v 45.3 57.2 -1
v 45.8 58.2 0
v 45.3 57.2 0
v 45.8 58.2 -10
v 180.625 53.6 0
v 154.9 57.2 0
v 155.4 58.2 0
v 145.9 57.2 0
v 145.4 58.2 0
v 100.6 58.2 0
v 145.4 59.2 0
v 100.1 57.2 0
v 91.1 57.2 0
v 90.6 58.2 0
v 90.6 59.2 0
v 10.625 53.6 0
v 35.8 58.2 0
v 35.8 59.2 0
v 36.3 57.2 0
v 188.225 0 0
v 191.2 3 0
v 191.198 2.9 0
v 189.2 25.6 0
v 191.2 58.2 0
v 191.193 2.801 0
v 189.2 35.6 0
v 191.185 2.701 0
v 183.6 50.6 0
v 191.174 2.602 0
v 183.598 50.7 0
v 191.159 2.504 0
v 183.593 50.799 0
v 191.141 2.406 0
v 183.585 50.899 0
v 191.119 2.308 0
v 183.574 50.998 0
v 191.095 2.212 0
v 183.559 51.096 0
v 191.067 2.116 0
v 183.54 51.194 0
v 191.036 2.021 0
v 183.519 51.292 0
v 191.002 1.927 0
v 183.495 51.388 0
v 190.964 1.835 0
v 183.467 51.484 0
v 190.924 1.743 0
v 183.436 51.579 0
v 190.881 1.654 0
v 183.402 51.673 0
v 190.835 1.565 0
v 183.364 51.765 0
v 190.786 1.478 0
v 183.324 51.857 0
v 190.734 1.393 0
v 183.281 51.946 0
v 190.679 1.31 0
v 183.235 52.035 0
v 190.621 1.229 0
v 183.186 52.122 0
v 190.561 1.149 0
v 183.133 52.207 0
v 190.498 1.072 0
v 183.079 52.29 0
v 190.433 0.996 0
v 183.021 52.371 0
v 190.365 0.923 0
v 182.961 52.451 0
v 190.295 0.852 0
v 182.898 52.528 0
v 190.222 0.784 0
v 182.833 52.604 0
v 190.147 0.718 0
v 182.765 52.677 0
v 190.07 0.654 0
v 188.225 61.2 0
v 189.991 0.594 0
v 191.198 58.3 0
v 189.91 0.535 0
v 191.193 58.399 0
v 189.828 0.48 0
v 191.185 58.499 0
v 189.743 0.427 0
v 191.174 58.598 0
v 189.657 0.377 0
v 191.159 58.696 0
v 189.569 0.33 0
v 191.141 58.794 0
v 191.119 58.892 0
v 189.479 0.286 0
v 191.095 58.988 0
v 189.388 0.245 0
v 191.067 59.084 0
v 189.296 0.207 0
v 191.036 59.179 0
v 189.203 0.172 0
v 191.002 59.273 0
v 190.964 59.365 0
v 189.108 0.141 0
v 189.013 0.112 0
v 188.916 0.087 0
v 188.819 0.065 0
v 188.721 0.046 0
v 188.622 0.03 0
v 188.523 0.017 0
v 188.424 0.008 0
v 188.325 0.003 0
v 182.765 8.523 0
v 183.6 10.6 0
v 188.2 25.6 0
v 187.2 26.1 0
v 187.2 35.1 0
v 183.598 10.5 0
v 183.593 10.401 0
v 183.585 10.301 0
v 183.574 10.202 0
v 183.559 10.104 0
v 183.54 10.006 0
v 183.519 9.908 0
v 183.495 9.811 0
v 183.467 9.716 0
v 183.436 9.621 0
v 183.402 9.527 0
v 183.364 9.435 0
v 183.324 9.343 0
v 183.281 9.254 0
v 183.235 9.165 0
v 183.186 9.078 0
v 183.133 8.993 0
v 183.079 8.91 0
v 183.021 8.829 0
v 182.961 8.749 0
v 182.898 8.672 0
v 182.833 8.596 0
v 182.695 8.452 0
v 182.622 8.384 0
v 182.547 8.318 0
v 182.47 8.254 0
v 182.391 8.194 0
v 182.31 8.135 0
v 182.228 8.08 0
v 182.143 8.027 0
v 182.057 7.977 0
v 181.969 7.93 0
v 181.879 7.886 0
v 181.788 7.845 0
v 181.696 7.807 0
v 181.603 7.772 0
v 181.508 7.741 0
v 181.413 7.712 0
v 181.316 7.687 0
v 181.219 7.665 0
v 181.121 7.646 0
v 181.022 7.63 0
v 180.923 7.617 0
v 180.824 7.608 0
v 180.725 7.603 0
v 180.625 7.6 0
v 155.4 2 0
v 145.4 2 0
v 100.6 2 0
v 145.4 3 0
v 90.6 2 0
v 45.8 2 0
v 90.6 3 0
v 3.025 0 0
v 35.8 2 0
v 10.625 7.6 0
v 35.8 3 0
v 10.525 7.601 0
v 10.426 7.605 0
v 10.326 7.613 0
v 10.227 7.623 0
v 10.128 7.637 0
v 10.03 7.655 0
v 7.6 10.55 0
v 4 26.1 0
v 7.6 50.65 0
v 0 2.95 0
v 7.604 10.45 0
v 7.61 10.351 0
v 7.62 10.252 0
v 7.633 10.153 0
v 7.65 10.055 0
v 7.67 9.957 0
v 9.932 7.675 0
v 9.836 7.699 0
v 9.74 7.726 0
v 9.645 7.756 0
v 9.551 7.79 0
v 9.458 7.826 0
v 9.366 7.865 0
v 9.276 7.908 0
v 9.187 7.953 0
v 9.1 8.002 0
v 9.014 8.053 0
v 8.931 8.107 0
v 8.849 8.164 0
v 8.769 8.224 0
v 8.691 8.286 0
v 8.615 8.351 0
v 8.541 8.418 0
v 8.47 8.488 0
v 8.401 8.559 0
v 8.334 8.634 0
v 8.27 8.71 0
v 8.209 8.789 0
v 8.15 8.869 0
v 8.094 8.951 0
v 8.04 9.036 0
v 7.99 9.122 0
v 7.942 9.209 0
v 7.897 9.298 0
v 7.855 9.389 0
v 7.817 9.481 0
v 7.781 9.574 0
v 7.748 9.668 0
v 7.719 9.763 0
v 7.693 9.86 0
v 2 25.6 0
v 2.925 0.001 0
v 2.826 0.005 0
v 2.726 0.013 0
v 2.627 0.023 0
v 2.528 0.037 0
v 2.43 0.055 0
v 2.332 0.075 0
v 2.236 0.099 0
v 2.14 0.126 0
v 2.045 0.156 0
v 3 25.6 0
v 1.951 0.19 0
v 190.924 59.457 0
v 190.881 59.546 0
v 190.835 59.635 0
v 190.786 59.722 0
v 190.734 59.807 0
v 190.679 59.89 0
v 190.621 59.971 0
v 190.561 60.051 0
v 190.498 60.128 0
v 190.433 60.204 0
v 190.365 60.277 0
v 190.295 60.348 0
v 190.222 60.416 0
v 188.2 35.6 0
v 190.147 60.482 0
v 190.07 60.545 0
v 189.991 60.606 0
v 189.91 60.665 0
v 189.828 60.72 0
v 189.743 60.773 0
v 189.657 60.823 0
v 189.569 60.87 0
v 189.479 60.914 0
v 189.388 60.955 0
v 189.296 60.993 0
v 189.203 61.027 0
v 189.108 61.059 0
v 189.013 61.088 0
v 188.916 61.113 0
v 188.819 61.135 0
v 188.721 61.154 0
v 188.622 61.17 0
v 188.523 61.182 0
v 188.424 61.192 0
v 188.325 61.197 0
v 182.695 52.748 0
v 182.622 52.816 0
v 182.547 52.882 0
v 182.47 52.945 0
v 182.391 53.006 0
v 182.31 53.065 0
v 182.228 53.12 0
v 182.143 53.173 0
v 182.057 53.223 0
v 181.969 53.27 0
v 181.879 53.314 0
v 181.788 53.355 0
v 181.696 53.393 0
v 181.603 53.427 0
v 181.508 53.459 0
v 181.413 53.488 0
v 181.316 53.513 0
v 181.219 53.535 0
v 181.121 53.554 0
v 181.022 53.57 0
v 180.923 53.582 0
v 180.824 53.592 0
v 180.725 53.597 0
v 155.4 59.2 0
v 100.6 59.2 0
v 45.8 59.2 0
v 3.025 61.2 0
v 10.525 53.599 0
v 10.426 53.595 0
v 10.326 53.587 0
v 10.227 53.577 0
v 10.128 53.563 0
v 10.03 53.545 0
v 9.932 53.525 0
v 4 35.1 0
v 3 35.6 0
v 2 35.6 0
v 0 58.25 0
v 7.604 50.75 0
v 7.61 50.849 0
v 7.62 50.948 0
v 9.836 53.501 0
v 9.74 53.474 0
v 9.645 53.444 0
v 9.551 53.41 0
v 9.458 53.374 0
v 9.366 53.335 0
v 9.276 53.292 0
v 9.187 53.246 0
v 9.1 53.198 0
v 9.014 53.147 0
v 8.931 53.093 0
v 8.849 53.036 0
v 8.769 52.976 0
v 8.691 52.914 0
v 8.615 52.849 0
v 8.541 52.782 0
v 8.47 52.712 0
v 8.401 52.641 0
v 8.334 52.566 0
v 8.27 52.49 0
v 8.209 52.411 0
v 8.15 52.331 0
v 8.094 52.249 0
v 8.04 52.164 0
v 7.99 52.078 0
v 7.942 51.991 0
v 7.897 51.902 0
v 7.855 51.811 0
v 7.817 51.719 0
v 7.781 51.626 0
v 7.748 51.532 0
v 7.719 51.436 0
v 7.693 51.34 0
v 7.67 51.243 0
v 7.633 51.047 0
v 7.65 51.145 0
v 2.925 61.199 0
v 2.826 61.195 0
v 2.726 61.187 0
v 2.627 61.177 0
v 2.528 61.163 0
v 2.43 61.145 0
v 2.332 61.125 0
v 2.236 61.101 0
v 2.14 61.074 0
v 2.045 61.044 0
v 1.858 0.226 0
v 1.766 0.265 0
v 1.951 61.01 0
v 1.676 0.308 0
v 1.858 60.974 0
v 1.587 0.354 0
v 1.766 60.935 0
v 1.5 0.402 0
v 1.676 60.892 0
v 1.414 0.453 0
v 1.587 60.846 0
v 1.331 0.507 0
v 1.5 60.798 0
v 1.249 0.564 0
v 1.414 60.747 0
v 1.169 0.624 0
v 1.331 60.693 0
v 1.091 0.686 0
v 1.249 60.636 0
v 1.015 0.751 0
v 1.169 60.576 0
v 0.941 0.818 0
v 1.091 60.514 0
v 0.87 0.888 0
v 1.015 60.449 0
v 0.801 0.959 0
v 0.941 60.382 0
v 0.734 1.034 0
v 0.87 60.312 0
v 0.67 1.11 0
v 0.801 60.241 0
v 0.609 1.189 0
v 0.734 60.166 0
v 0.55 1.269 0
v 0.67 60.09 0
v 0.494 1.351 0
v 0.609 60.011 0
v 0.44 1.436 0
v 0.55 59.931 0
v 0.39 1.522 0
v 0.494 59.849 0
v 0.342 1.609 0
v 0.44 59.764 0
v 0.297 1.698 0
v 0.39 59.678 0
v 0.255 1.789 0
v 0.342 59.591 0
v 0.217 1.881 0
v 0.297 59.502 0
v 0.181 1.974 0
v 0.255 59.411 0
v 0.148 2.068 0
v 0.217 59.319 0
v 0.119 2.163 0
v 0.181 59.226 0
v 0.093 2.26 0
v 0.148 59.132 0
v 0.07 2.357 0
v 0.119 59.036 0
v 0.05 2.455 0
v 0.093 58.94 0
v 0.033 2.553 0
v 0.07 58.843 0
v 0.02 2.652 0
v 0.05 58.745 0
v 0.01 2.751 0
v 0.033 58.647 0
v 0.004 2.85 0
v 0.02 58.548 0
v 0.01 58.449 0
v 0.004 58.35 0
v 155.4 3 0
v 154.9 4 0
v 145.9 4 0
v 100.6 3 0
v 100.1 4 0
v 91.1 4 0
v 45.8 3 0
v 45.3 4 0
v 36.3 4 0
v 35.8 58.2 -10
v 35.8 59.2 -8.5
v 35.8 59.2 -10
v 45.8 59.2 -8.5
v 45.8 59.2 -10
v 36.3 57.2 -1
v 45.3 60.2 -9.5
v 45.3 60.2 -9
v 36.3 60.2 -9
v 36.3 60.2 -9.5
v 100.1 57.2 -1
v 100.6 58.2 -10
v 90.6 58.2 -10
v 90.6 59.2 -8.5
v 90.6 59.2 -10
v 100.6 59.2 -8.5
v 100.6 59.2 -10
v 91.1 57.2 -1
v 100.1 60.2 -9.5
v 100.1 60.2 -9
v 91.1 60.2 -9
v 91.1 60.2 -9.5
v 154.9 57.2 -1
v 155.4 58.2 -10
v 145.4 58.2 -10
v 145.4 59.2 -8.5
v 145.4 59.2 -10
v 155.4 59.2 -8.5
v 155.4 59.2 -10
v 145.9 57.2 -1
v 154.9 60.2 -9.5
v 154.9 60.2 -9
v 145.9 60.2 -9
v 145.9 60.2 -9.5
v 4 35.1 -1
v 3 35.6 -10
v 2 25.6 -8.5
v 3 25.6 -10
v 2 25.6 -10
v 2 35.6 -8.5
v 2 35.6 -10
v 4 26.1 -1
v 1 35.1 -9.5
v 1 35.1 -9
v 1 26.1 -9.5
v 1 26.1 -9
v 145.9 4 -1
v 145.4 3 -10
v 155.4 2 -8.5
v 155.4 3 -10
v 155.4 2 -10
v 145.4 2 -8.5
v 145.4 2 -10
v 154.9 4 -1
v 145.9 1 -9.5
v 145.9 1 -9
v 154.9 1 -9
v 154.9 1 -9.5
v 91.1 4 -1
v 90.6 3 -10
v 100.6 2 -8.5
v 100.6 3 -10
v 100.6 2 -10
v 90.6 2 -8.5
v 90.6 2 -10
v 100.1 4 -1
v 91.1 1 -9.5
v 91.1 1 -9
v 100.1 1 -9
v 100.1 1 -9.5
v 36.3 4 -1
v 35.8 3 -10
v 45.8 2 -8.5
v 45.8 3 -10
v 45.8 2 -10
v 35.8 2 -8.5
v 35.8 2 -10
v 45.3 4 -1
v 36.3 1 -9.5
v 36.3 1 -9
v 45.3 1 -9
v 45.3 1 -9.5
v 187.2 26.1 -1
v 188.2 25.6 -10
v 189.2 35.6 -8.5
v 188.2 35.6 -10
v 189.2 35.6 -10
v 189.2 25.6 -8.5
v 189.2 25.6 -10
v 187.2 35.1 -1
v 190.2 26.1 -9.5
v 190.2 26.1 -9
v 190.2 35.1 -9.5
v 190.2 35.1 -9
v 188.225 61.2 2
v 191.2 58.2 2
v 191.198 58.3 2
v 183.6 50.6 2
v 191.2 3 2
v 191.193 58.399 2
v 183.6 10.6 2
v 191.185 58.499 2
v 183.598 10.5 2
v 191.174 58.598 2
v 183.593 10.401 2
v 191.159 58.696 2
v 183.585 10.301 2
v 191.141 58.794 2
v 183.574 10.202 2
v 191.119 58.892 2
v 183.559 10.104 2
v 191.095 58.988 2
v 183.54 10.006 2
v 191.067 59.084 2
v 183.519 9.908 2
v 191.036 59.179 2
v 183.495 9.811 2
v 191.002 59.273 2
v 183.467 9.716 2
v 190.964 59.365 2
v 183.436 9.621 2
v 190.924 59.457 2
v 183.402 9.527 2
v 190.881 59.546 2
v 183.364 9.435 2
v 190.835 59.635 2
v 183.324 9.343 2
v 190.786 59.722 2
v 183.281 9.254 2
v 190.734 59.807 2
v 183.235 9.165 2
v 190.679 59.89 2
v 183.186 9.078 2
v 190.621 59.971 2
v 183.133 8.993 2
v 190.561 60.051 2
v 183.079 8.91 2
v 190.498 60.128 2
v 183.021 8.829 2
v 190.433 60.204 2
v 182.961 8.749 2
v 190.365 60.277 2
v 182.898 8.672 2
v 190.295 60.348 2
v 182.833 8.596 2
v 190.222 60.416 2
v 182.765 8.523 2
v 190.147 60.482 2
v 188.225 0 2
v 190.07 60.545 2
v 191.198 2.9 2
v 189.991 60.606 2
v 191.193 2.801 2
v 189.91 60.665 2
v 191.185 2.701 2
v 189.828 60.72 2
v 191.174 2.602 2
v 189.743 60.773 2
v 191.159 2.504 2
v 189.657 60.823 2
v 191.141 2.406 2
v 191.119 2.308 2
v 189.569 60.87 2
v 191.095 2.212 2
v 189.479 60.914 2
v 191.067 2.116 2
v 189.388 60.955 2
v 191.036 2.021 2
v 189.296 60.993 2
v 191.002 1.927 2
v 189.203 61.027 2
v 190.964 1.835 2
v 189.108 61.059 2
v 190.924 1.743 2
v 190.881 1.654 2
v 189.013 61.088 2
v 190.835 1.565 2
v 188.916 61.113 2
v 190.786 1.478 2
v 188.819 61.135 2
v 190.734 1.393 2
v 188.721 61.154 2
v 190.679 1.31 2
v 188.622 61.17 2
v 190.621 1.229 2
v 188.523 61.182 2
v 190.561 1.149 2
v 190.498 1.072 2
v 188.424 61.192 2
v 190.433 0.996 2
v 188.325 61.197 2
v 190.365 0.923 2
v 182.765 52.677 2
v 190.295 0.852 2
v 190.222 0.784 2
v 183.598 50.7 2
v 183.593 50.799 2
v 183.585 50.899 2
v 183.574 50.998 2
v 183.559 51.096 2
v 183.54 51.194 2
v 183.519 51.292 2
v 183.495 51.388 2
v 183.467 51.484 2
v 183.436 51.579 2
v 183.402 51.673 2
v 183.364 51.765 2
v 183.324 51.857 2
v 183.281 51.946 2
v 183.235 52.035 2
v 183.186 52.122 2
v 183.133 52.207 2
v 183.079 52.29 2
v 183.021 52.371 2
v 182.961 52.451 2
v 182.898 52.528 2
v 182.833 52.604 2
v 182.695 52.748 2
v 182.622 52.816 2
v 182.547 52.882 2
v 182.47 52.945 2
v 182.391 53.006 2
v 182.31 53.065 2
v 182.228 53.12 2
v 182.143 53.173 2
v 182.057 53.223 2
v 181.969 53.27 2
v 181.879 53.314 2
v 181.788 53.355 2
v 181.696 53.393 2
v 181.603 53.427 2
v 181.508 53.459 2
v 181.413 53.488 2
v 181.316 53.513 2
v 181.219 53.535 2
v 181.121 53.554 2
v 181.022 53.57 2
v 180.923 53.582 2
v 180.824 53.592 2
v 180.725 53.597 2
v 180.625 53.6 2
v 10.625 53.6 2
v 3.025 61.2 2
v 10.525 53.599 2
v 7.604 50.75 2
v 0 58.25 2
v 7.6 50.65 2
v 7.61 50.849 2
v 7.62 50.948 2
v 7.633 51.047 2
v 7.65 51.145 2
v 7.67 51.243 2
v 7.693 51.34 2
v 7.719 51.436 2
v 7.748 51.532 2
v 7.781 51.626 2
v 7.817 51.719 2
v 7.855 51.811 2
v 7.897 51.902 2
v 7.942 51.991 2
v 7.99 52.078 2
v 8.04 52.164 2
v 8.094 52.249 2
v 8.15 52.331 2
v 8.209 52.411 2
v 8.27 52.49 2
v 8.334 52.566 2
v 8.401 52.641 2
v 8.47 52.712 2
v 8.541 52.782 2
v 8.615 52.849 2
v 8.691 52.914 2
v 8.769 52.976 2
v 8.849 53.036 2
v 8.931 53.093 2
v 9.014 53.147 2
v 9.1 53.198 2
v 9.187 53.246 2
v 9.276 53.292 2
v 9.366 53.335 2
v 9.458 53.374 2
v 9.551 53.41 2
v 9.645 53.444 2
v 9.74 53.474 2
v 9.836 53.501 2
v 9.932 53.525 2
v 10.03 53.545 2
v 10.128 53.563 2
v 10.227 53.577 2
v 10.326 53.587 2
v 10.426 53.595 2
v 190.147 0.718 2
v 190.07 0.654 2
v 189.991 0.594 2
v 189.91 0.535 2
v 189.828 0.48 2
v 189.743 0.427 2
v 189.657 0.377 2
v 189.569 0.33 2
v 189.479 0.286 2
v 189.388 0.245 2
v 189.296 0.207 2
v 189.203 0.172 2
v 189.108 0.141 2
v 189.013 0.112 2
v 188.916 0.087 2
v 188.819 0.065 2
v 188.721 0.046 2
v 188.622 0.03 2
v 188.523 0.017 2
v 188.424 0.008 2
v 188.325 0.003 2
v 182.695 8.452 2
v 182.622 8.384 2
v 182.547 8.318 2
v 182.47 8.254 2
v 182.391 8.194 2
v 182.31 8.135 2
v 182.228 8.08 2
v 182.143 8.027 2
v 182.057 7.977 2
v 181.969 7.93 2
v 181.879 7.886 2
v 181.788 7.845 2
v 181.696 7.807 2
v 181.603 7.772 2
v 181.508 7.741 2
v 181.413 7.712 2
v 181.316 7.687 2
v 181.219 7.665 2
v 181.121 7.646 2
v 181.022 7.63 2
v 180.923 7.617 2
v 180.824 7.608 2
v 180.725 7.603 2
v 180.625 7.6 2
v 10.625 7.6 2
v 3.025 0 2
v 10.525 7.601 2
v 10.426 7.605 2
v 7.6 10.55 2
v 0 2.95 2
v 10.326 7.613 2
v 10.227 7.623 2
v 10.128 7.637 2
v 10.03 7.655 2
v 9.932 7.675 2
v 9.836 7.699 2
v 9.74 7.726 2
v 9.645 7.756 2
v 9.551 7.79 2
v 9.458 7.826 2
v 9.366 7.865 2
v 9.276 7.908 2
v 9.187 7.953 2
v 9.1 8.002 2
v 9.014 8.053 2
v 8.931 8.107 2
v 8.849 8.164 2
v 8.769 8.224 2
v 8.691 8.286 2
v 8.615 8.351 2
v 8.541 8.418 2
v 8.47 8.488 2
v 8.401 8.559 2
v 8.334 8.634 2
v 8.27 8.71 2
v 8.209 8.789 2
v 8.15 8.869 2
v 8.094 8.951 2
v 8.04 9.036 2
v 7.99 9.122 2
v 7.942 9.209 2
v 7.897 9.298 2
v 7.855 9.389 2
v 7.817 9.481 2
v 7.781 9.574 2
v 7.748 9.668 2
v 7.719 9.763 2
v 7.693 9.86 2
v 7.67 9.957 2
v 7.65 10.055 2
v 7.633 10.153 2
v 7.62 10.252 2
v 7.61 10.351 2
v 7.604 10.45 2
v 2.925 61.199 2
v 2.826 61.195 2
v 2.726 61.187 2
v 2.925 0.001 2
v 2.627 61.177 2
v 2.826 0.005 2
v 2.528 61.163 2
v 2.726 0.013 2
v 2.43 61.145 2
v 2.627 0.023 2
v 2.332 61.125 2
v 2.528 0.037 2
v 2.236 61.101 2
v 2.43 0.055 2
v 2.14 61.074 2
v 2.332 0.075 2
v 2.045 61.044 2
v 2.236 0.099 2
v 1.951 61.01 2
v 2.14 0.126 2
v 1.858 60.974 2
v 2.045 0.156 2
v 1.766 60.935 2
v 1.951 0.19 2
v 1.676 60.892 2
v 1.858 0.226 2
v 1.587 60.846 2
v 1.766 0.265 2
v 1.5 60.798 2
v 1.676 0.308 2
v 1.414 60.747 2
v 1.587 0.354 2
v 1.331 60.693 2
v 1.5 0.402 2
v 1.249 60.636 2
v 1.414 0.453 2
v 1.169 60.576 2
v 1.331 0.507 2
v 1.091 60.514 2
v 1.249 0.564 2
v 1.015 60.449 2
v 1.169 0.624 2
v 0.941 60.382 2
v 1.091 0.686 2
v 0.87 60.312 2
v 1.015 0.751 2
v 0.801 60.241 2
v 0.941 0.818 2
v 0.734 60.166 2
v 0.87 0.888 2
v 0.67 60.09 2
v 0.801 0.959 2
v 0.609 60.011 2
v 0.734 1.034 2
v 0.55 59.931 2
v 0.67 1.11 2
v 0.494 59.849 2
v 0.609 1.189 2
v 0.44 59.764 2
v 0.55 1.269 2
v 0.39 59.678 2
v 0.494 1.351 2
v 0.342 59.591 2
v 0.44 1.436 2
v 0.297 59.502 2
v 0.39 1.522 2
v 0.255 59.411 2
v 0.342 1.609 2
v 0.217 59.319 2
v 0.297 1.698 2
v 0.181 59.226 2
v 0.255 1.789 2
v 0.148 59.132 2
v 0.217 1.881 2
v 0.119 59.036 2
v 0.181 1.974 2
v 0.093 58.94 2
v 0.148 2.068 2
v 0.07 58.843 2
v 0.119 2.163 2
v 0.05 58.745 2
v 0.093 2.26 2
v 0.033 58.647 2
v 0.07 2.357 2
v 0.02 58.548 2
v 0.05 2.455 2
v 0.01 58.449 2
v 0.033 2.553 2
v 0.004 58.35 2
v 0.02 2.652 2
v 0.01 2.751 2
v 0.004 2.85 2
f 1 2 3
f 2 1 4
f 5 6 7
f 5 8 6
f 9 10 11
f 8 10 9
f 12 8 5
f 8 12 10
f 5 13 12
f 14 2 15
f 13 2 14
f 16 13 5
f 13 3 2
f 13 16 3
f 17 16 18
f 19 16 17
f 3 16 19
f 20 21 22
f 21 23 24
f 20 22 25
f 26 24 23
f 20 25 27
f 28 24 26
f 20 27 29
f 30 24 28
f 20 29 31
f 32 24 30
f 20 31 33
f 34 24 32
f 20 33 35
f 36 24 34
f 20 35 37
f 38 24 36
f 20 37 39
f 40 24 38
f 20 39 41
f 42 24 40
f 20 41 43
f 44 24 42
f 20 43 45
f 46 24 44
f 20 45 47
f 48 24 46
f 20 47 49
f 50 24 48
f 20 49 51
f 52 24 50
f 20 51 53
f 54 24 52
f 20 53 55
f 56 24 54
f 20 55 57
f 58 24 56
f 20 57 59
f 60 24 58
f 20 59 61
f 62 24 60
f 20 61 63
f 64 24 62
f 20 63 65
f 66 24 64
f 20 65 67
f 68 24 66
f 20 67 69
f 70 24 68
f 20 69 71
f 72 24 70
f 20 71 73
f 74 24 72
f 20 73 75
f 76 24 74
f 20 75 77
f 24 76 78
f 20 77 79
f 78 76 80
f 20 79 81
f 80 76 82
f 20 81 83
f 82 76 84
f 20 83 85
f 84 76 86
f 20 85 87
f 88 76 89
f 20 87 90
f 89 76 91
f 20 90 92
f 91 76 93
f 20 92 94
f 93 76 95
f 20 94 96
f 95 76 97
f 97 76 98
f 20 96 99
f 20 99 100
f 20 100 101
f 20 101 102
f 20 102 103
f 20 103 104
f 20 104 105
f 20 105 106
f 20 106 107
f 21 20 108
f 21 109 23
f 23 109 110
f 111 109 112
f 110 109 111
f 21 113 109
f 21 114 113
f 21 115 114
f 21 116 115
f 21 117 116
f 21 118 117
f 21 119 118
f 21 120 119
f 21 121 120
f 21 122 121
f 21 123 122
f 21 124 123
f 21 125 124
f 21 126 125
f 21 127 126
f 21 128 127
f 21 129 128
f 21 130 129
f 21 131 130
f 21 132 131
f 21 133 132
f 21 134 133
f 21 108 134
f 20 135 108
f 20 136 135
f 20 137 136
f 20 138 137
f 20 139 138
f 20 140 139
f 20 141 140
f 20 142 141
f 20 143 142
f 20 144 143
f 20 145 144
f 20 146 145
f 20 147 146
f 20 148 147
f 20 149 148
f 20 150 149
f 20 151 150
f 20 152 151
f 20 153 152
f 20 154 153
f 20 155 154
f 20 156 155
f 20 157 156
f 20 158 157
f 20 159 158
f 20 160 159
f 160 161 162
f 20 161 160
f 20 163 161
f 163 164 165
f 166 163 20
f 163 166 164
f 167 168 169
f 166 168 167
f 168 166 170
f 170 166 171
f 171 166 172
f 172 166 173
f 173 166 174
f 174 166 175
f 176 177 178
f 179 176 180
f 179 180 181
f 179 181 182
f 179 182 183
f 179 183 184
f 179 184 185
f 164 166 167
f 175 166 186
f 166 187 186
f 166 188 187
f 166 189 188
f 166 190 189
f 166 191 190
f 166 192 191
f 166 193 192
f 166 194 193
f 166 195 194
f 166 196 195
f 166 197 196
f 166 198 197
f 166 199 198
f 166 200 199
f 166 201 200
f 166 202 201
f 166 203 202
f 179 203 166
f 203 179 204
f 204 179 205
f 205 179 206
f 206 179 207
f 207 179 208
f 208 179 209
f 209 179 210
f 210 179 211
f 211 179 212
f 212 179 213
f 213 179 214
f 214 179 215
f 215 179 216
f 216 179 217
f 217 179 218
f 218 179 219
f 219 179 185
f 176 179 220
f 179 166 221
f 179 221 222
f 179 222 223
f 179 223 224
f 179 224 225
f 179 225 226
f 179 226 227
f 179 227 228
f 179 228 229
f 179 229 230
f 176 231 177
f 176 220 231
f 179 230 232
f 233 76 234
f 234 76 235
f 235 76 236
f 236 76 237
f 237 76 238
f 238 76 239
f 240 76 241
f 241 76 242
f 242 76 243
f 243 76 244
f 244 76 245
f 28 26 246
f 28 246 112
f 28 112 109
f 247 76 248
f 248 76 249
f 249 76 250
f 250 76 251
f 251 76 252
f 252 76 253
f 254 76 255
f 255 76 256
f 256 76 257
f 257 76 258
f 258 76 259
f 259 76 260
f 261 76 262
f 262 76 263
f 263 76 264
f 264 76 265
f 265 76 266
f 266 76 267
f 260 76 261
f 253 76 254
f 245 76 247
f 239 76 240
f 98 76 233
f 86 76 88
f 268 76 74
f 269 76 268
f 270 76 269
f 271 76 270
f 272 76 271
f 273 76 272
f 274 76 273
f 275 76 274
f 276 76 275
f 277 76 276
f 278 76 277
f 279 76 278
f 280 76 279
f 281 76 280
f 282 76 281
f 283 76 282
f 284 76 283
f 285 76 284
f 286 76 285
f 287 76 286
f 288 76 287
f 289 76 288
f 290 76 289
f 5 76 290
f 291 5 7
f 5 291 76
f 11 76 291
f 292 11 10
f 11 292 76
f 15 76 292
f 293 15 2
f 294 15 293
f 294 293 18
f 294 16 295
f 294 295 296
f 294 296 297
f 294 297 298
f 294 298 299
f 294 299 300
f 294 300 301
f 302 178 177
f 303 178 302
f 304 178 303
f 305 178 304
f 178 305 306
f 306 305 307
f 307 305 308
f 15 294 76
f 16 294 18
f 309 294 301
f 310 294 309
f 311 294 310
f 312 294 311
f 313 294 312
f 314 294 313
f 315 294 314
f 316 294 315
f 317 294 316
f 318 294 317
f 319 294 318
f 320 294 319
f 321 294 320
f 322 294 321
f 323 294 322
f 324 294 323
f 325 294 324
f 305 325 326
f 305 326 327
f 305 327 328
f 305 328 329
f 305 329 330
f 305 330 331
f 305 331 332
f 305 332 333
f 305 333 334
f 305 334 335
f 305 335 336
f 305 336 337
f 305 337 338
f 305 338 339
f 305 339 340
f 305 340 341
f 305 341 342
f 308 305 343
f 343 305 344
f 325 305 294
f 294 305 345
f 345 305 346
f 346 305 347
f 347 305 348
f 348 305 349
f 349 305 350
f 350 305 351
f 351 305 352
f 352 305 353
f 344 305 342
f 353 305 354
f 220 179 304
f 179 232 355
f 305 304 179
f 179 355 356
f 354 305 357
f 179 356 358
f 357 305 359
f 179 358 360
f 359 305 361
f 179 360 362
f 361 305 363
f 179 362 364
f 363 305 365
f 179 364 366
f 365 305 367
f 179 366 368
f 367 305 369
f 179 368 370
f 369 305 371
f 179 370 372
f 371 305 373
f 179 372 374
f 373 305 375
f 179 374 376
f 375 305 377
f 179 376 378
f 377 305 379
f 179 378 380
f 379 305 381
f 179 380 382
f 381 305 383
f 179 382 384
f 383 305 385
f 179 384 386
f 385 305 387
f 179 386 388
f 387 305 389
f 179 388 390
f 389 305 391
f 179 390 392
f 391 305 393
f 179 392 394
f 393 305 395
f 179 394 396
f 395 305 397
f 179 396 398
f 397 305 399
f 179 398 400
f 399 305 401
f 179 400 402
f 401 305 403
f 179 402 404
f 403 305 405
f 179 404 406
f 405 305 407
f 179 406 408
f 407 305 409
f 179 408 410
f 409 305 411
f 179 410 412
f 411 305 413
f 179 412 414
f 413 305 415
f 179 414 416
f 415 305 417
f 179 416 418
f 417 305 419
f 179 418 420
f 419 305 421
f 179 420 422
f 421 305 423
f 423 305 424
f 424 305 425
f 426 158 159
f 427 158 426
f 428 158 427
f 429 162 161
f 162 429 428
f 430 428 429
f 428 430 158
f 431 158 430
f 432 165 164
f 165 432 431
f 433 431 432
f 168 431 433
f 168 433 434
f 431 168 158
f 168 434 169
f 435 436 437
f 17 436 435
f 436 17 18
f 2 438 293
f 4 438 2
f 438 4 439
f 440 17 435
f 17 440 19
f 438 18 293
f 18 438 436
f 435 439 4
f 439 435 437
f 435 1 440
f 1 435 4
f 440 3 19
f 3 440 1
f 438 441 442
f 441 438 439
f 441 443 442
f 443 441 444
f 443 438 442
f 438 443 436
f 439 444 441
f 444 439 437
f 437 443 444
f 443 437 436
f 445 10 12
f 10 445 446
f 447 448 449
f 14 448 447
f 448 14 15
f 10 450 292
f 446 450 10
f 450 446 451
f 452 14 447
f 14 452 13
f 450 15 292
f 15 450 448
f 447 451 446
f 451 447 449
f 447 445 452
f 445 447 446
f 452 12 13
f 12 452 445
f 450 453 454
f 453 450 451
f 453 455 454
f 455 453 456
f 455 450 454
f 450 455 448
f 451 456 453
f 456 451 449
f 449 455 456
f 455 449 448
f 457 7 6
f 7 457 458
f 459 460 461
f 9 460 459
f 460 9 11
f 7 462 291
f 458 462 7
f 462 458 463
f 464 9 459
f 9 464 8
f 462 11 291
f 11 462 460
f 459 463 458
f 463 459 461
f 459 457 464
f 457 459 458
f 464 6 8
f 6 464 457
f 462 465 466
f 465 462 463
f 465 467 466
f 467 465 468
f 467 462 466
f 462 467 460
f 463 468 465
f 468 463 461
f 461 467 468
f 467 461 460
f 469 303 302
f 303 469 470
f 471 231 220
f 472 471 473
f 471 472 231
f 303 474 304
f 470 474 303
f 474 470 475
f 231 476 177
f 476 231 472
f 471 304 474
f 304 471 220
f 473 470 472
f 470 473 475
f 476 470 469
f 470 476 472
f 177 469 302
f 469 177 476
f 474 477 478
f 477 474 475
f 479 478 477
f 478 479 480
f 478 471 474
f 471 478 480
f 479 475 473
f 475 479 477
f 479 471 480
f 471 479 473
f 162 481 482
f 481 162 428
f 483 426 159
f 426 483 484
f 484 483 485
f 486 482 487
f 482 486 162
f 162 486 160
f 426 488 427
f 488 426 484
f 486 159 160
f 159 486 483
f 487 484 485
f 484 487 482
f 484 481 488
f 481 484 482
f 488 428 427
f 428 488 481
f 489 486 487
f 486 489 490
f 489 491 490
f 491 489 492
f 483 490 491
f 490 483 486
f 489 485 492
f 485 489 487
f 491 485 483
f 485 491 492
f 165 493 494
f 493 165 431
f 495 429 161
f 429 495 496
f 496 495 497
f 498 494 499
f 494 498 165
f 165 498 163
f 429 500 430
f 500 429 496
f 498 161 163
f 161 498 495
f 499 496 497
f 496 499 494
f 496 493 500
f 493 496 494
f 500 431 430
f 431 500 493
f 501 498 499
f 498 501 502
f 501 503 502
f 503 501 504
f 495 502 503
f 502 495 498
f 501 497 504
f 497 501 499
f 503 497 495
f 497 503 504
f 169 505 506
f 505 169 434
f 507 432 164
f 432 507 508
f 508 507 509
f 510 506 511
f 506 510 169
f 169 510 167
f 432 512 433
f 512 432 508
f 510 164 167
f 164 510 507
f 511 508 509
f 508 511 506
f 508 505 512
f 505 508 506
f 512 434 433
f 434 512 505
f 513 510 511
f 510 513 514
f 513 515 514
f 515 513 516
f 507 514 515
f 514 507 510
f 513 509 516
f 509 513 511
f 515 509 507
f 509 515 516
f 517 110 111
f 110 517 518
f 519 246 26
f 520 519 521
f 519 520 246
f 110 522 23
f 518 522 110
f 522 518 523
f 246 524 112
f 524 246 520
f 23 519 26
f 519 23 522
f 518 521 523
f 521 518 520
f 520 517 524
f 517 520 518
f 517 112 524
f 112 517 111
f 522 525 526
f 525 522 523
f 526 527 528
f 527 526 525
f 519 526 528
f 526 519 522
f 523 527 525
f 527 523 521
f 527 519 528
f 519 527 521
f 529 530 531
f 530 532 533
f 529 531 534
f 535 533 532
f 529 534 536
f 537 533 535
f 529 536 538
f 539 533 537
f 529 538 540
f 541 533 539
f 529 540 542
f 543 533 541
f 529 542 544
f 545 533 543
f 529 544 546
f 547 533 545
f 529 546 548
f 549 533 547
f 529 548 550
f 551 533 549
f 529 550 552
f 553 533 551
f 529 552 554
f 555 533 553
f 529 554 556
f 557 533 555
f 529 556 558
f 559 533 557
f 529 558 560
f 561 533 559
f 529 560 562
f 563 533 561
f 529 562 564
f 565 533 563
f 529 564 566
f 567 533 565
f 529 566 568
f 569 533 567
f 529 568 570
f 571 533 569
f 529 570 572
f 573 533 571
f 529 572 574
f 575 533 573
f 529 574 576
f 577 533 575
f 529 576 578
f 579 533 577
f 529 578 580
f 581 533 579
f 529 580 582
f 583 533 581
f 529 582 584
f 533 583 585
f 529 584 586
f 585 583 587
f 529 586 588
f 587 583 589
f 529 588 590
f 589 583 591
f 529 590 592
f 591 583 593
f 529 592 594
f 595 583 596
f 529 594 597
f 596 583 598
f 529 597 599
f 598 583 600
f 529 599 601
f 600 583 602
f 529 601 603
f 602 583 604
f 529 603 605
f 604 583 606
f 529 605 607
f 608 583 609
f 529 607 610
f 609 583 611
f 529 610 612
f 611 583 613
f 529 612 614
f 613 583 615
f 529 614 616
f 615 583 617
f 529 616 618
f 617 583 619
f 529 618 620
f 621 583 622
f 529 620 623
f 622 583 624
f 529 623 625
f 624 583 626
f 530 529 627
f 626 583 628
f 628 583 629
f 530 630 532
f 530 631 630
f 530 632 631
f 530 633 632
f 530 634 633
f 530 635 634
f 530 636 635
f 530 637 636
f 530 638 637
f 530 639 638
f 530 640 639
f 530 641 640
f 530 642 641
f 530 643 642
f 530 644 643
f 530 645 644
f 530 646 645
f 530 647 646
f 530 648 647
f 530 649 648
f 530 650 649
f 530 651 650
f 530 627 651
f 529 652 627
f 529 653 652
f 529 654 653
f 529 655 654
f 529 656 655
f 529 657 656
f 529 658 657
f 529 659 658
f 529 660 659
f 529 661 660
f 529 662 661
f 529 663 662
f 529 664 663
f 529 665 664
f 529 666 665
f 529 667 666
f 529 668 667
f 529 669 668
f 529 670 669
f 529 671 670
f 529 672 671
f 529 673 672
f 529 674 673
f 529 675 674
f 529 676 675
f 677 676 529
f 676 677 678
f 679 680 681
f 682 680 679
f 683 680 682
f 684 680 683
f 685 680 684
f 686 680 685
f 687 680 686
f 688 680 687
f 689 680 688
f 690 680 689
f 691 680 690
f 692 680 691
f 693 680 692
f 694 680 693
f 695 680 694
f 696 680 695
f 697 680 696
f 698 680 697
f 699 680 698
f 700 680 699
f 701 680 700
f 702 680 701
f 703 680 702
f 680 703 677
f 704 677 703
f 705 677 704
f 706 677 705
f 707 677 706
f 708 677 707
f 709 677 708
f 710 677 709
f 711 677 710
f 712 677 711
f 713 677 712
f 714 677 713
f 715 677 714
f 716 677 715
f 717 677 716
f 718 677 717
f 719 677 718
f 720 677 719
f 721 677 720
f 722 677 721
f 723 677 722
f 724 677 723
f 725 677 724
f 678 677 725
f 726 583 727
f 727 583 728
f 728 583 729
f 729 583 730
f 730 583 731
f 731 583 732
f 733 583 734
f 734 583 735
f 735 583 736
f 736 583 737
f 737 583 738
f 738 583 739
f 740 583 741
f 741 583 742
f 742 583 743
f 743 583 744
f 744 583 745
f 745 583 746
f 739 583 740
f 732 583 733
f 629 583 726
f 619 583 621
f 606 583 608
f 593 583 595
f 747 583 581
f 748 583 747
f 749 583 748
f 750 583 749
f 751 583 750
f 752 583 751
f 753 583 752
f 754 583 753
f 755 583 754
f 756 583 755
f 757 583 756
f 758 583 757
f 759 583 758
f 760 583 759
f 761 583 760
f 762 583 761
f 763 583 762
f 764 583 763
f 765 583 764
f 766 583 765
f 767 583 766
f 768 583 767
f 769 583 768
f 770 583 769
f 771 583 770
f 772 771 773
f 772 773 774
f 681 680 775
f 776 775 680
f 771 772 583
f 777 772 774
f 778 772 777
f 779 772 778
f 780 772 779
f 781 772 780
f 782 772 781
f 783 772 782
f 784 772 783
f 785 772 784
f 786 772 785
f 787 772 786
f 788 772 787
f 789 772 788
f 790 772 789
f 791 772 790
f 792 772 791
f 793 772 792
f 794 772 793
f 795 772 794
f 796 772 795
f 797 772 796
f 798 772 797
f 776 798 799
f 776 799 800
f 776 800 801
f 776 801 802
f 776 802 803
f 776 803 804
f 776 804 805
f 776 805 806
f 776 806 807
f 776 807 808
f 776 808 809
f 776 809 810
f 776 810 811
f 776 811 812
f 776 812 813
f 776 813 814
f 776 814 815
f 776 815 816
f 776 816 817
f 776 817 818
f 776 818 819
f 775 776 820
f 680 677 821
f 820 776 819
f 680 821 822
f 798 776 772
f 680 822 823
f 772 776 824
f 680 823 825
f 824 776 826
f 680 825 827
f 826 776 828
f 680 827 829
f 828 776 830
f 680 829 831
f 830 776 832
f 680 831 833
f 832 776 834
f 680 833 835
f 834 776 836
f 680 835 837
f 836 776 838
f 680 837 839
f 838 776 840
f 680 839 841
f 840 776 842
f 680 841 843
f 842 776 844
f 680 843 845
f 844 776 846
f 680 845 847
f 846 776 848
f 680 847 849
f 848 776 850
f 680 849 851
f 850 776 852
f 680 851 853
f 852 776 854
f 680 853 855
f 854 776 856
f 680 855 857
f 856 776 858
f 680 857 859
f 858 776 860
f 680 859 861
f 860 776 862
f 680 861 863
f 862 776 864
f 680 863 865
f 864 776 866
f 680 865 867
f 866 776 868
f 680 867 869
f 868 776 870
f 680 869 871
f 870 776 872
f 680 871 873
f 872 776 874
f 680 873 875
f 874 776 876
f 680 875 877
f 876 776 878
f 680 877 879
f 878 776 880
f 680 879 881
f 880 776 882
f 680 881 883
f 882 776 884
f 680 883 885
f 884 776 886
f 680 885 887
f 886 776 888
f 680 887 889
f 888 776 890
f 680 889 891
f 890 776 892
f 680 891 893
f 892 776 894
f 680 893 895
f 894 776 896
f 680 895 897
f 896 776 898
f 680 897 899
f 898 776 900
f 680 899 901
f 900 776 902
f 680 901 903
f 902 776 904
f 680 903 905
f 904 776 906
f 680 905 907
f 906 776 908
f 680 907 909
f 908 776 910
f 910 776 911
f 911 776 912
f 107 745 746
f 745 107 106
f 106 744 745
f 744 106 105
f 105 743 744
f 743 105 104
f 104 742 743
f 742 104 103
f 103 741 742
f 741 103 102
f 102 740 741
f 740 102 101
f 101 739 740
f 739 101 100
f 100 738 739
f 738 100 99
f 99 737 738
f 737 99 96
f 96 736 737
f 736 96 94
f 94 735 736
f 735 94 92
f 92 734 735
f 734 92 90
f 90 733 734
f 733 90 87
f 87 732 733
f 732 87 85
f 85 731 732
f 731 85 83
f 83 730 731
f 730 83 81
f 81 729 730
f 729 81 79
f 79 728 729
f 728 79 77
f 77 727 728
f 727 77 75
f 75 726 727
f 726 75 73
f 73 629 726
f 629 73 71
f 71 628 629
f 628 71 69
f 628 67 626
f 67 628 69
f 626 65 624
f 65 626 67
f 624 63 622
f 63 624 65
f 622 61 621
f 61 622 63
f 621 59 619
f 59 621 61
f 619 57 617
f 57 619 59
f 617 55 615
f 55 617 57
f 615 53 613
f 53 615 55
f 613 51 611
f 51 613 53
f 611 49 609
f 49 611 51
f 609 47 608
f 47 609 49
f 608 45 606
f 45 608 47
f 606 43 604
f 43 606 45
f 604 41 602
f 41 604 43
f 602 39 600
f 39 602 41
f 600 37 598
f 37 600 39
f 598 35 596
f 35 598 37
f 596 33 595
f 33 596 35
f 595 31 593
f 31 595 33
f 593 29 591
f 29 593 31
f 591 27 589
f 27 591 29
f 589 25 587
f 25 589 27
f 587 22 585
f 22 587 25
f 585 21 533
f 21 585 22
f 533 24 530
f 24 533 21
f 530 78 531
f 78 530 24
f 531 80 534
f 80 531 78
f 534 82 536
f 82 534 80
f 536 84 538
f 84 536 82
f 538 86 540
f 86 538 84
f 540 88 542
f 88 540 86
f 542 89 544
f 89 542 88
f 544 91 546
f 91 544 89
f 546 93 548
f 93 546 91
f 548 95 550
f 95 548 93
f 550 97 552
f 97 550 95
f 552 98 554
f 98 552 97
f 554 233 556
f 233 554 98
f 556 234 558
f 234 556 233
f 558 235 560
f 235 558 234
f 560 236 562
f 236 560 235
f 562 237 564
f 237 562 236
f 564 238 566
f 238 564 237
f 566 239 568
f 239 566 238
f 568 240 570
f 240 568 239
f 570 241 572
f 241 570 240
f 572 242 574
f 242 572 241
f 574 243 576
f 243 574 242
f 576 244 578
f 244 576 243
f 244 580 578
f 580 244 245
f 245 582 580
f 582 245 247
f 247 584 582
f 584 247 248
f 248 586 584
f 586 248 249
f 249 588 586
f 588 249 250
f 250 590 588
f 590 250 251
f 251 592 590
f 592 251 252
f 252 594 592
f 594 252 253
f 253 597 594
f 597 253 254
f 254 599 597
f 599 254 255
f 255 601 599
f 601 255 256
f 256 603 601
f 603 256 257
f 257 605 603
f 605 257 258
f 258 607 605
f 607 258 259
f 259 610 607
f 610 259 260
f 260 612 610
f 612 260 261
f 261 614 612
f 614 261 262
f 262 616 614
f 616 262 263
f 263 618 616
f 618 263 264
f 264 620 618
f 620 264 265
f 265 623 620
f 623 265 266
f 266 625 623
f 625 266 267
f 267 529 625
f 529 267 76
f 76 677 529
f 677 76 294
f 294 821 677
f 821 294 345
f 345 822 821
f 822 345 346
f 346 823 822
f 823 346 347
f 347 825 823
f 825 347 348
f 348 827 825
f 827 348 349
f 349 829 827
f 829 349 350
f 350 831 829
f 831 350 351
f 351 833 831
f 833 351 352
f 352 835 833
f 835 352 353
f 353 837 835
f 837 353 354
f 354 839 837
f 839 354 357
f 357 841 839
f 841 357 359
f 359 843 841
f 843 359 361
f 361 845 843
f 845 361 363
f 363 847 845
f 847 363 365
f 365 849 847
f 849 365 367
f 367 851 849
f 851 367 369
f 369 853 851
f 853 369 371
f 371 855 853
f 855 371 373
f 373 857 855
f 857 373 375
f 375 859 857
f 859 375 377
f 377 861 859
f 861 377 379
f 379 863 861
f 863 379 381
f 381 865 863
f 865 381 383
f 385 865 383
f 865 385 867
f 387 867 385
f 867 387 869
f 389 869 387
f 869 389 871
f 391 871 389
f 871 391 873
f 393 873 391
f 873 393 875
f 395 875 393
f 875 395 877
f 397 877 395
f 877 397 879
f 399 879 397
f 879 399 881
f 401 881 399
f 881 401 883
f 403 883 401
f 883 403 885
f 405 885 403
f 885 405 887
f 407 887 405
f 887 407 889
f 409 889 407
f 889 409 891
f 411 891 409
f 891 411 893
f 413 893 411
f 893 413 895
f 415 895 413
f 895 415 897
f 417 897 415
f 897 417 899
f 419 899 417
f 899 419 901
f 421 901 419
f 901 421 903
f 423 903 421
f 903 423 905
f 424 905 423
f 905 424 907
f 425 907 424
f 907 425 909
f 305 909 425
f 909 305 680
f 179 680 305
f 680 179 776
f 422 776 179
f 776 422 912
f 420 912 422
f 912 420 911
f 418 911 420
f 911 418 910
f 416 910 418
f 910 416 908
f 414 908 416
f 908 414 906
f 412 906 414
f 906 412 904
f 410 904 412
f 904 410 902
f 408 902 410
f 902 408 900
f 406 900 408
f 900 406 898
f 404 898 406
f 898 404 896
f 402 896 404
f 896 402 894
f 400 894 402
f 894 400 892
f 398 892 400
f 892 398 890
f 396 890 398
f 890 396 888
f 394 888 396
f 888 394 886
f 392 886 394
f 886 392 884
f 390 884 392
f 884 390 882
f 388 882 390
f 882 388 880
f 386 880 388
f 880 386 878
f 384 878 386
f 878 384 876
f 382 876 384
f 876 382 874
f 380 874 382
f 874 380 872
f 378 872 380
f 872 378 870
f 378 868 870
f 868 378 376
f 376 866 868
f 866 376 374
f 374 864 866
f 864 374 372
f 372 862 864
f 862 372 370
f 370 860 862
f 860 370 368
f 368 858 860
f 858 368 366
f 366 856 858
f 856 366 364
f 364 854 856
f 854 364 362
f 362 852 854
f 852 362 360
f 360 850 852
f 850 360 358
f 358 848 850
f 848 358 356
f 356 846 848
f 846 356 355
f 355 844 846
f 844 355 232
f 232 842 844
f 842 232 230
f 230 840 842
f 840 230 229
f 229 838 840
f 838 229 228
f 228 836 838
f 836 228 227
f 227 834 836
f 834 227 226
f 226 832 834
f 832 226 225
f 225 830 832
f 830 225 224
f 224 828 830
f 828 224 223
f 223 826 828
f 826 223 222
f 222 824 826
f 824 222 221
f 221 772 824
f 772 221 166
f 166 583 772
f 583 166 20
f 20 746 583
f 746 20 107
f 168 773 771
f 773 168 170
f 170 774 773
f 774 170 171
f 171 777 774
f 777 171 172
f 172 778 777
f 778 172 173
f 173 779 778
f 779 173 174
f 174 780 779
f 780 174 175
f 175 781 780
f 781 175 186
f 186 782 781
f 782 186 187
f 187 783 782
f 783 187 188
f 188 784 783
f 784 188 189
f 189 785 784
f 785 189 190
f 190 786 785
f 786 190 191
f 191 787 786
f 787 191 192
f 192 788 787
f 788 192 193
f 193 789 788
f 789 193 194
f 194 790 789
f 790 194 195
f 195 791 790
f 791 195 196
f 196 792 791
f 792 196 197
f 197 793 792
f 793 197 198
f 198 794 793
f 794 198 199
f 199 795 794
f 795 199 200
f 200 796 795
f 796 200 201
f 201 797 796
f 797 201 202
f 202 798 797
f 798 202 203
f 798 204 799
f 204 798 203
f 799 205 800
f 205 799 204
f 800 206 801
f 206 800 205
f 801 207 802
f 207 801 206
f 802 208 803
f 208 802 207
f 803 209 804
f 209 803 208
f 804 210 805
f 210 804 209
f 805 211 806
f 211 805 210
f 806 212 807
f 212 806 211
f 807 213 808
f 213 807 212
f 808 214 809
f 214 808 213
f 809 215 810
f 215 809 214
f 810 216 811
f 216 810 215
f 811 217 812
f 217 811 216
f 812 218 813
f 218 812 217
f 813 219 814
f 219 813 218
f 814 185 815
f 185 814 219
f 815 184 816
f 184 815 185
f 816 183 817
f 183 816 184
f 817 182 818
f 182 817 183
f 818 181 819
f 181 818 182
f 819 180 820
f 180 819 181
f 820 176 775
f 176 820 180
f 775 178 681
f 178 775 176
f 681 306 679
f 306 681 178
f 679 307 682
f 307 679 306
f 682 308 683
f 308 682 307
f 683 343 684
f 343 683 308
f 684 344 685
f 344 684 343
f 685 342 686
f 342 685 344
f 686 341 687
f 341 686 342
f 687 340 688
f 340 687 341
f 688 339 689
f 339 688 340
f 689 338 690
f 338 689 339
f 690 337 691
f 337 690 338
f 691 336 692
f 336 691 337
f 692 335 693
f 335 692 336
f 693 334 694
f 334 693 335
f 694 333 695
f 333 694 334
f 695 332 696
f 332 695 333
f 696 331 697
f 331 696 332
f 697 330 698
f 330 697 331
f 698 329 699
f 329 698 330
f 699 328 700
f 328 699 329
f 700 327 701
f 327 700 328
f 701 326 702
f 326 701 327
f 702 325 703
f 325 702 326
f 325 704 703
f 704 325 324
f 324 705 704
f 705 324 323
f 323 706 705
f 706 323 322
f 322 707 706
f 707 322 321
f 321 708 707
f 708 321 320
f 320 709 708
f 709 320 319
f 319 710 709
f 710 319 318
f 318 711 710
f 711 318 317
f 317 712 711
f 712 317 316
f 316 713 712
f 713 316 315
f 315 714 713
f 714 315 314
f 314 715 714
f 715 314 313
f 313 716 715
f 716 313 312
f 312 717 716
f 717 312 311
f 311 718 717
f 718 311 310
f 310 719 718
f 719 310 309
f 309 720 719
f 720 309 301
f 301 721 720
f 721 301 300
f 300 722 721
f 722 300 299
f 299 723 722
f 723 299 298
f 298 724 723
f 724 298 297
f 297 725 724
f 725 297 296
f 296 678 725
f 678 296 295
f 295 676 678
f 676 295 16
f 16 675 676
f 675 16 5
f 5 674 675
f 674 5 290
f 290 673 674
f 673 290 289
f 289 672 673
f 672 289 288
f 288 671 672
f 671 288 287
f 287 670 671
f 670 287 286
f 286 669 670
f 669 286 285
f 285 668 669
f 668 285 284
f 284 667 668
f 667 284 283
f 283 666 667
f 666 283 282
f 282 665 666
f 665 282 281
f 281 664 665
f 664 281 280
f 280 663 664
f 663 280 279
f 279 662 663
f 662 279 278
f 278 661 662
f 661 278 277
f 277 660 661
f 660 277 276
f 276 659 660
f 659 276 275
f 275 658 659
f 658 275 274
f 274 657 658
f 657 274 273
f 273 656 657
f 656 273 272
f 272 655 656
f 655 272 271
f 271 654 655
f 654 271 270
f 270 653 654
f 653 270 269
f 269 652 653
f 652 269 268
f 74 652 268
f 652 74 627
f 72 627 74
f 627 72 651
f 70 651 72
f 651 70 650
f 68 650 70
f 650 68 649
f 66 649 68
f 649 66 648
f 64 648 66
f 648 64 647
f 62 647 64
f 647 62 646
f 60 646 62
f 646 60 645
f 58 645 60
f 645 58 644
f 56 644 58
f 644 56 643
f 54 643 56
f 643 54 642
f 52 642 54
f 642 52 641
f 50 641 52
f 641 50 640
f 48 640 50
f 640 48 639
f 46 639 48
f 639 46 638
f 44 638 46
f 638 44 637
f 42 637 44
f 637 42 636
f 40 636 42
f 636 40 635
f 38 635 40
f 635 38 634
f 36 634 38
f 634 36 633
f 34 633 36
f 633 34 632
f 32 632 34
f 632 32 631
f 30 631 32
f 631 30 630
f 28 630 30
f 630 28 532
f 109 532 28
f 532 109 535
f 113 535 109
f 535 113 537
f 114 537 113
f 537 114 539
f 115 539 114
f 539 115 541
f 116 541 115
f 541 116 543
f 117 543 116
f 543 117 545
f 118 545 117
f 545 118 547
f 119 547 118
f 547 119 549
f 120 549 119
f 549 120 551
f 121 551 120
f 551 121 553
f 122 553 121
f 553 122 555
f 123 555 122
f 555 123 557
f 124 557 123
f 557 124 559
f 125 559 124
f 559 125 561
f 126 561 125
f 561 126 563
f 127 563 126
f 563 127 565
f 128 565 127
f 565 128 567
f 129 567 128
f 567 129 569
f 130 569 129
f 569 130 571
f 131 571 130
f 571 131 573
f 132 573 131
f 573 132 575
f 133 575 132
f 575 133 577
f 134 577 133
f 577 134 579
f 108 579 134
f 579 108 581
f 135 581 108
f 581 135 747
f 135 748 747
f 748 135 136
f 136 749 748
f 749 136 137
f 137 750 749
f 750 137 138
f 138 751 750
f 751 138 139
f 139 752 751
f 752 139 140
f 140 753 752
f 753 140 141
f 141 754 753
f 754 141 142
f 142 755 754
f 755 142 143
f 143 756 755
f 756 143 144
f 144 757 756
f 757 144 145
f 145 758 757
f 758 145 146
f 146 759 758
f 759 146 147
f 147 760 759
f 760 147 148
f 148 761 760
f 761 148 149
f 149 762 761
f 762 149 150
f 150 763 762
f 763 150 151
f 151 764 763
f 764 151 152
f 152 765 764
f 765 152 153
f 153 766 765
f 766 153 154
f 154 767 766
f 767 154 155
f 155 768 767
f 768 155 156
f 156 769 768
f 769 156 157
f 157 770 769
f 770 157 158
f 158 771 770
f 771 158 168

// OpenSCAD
// file: vitamins/seesaw.scad
$fa = 1;
$fs = 0.5;

BOARD_THICKNESS = 1.57;

seesaw();

module seesaw() {
  difference() {
    union() {
      cube([40, 5, BOARD_THICKNESS]);

      translate([0, 5, 0])
      cube([40, 25, 13]);
    }

    translate([(40 - 36.5) / 2, 2.5])
    union() {
      hole([0, 0]);
      hole([36.5, 0]);
    }
  }
}


module hole(pos) {
  translate(pos)
  translate([0, 0, -1])
  cylinder(d=2.5, h=3);
}
// file: vitamins/neopixel.scad
$fa = 1;
$fs = 0.5;

// This appears to be a standard circuit board size
BOARD_THICKNESS = 0.78;

neopixel();

module neopixel() {
  // Board
  cylinder(d=12.7, h=BOARD_THICKNESS);

  // LED
  linear_extrude(2.5)
  square([5, 5], center=true);
}
// file: util/standoff.scad
$fn = 50;

standoff(height=3, board_size=1.57);

translate([20, 20])
positive_standoff(height=3, board_size=1.57);


color("white")
translate([0, 0, 5.4])
mirror([0, 0, 1])
standoff_pin(height=3, board_size=1.57);

module standoff(height, board_size) {
  difference() {
    union() {
      cylinder(h=height, d=3.5);
    }

    translate([0, 0, .2])
    cylinder(h=height + board_size, d=2.1);

  }
  fillet(width=3.5, r=2);
}

module positive_standoff(height, board_size) {
  union() {
    cylinder(h=height, d=3.5);
    cylinder(h=height + board_size, d=2.5);
  }
  fillet(width=3.5, r=2);
}

module standoff_pin(height, board_size) {
  cylinder(h=0.5, d=3.5);
  hull() {
    cylinder(h=height, d=2.3);

    translate([0, 0, height + board_size - 0.1])
    cylinder(h=0.1, d=1);
  }
}

module fillet(width, r) {
  rotate_extrude()
  translate([width/2, 0])
  difference() {
    square(r);

    translate([r, r])
    circle(r);
  }
}
// file: light_holder.scad
use <vitamins/neopixel.scad>;
/* use <vitamins/rpi0.scad>;
use <vitamins/seesaw.scad>; */


$fa = 1;
$fs = 0.1;

HOLE = 7.2;
HEIGHT = 2.5;
ID = 13.4;
OD = 15;
WALL = (OD - ID) / 2;
NOTCH = [0.75, 1];
OVERHANG = 0.6;


light_holder();


module light_holder() {
  rotate_extrude()
  light_holder_profile();
}

module light_holder_outline() {
  rotate_extrude()
  union() {
    light_holder_profile();
    hull() {
      square([ID / 2, HEIGHT]);
      square([ID / 2 - OVERHANG, HEIGHT + 0.7]);
    }
  }
}

module light_holder_profile() {
  translate([HOLE / 2, 0])
  square([(ID - HOLE) / 2, 0.5]);

  translate([ID / 2, 0])
  square([WALL, HEIGHT]);

  translate([ID / 2, HEIGHT])
  hull() {
    square([WALL, 0.2]);

    translate([-OVERHANG, 0.5])
    square([WALL, 0.2]);
  }

  translate([OD / 2, 0])
  square(NOTCH);
}

/* translate([20, 20]) */
/* translate([0, 0, 2])
mirror([0, 0, 1])
color("PaleGreen")
neopixel(); */
// file: vitamins/rpi0.scad
// From: https://www.raspberrypi.org/documentation/hardware/raspberrypi/mechanical/rpi_MECH_Zero_1p3.pdf
use <../util/panel.scad>;

$fa = 1;
$fs = 0.5;


// This appears to be a standard circuit board size
BOARD_THICKNESS = 1.57;

rpi0();

module rpi0() {
  difference() {
    translate([3, 3])
    panel(l=30 - 6, w=65 - 6)
    cylinder(r=3, h=BOARD_THICKNESS);


    hole([3.5, 3.5]);
    hole([58 + 3.5, 3.5]);
    hole([58 + 3.5, 30 - 3.5]);
    hole([3.5, 30 - 3.5]);
  }

  place(x=41.1)
  usb();

  place(x=54)
  usb();

  place(y=16.9)
  microsd();

  place(x=12.4)
  hdmi();

  place(y=15, x=65)
  mirror([1, 0, 0])
  ribbon();
}

module place(x=0, y=0) {
  translate([x, y, BOARD_THICKNESS])
  children();
}

module hole(pos) {
  translate(pos)
  translate([0, 0, -1])
  cylinder(d=2.5, h=3);
}

module usb() {
  translate([-4, -1.5, 0])
  cube([8, 6, 3]);
}

module microsd() {
  translate([-2.5, -6, 0])
  cube([15.5, 12, 1.4]);
}

module hdmi() {
  translate([-11.25/2, -0.5, 0])
  cube([11.25, 7.75, 3.5]);
}

module ribbon() {
  translate([-1.25, -17/2, 0])
  cube([4.5, 17, 1.25]);
}
// file: vitamins/mounting_screw.scad
$fa = 1;
$fs = 0.5;


color("silver", 0.5)
translate([0, 6.5, -2.25])
mounting_screw();

linear_extrude(2)
difference() {
  square(30, center=true);
  mounting_screw_hole();
}
translate([30, 0, 0])
linear_extrude(2.5)
difference() {
  square(30, center=true);
  mounting_screw_hole();
}

module mounting_screw() {
  cylinder(h=2, d=8);

  translate([0, 0, 2]) {
    cylinder(h=2.5, d=4);

    translate([0, 0, 2.5]) {
      cylinder(h=1.5, d=8);
    }
  }

  hull() {
    cylinder(h=23, d=4);

    translate([0, 0, 28.5])
    sphere(0.01);
  }
}

module mounting_screw_hole() {
  circle(d=9.5);

  hull() {
    square(center=true, 4.25);
    translate([0, (9.5 + 4.25) / 2, 0])
    circle(d=4.25);
  }
}
// file: seesaw_mount.scad
use <util/panel.scad>;
use <util/standoff.scad>;

$fa = 1;
$fs = 0.1;

translate([2.5, 2.5, 1])
seesaw_mount();

linear_extrude(1)
rounded_panel([45, 30]);

module seesaw_mount() {
  module hole(pos) {
    translate(pos)
    standoff(height=13, board_size=1.57);
  }

  translate([(40 - 36.5) / 2, 2.5])
  union() {
    hole([0, 0]);
    hole([36.5, 0]);
  }
}
// file: rpi0_mount.scad
use <util/panel.scad>;
use <util/standoff.scad>;

$fa = 1;
$fs = 0.1;

translate([2.5, 2.5, 1])
rpi0_mount();

linear_extrude(1)
rounded_panel([70, 35]);

module rpi0_mount() {
  module hole(pos, screw=false) {
    translate(pos)
    if (screw) {
      standoff(height=5, board_size=1.57);
    } else {
      positive_standoff(height=5, board_size=1.57);
    }
  }

  hole([3.5, 3.5], screw=true);
  hole([58 + 3.5, 3.5]);
  hole([58 + 3.5, 30 - 3.5], screw=true);
  hole([3.5, 30 - 3.5]);
}
// file: light_box.scad
use <util/panel.scad>;
use <light_holder.scad>;

$fa = 1;
$fs = 0.1;

OUTDER_DIMENSIONS = [180, 50];
WALLS = [2, 2];
HEIGHT = 18;
FLOOR = 0.5;

light_box();

module light_box() {
  translate([0, 0, FLOOR])
  shell();

  linear_extrude(FLOOR)
  rounded_panel(OUTDER_DIMENSIONS);
}

function light_box_dimensions() = OUTDER_DIMENSIONS;
function light_box_height() = HEIGHT + FLOOR;



module light_cutout() {
  OVERHANG = 4;
  translate([0, 2, 0])
  rotate([90, 0, 0])
  union() {
    light_holder_outline();

    // Make the base taller so it can sit flush when cut out
    translate([0, 0, -0.5])
    light_holder_outline();

    translate([0, 50, WALLS[0] / 2])
    cube([15 - OVERHANG, 100, 2 * WALLS[0]], center = true);
  }
}

module shell() {
  difference() {
    linear_extrude(HEIGHT)
    difference() {
      rounded_panel(OUTDER_DIMENSIONS);

      translate(WALLS)
      rounded_panel(OUTDER_DIMENSIONS - 2 * WALLS);
    }

    union() {
      translate([OUTDER_DIMENSIONS[0] / 2, 0, HEIGHT / 2])
      light_cutout();

      translate([OUTDER_DIMENSIONS[0], OUTDER_DIMENSIONS[1] / 2, HEIGHT / 2])
      rotate([0, 0, 90])
      light_cutout();

      translate([OUTDER_DIMENSIONS[0] / 2, OUTDER_DIMENSIONS[1], HEIGHT / 2])
      rotate([0, 0, 180])
      light_cutout();

      translate([0, OUTDER_DIMENSIONS[1] / 2, HEIGHT / 2])
      rotate([0, 0, 270])
      light_cutout();
    }
  }
}
// file: case.scad
use <util/panel.scad>;
use <util/distribute.scad>;
use <light_box.scad>;
use <rpi0_mount.scad>;
use <seesaw_mount.scad>;
use <vitamins/mounting_screw.scad>;
use <vitamins/rpi0.scad>;

$fa = 1;
$fs = 0.1;

WALLS = [2, 2];
GAP = [3.5, 3.5];
HOLDERS = [6, 6];                                                                                                                           ;
INNER_CLEARANCE = light_box_dimensions() + [0.2, 0.2];
INNER_WALL = INNER_CLEARANCE + 2 * GAP;
OUTER_WALL = INNER_WALL + 2 * WALLS;

BACK_THICKNESS = 2.5;
ELECTRONICS_CLEARANCE = 16;


RPI_OFFSET = 13.5;


case();

/* color("green")
translate([75 + RPI_OFFSET, 15, 2 + 7])
rotate([0, 180, 0])
rpi0(); */

function case_dimensions() = OUTER_WALL;

function case_height() = ELECTRONICS_CLEARANCE + BACK_THICKNESS + light_box_height() + 1;

module case() {
  translate([0, 0, ELECTRONICS_CLEARANCE + BACK_THICKNESS])
  case_top();

  difference() {
    case_bottom();

    translate([15 + RPI_OFFSET, -1, BACK_THICKNESS + 1])
    cube([25, 5, 7.5]);
  }

  translate([10 + RPI_OFFSET, 15, BACK_THICKNESS])
  rpi0_mount();

  translate([120, 15, BACK_THICKNESS])
  seesaw_mount();
}

module case_top() {
  difference() {
    linear_extrude(light_box_height() + 1)
    union() {
      case_wall();
      insets(depth=GAP);
    }

    attachment_points()
    translate([0, 0, light_box_height() + 1])
    latch();
  }
}

module case_bottom() {
  translate([0, 0, BACK_THICKNESS])
  linear_extrude(ELECTRONICS_CLEARANCE)
  union() {
    case_wall();

    insets(depth=HOLDERS);
  }

  linear_extrude(BACK_THICKNESS)
  difference() {
    rounded_panel(OUTER_WALL);

    translate(INNER_WALL)
    translate([-14, -15])
    mounting_screw_hole();

    translate([WALLS[0], INNER_WALL[1]])
    translate([14, -15])
    mounting_screw_hole();
  }
}

module latch() {
  translate([-5, -1, 0])
  hull() {
    cube([10, 1, 1.5]);

    translate([0.5, 1.5, 0.5])
    cube([9, 0.5, 0.5]);
  }
}

module insets(depth) {
  module long_wall_insets() {
    translate([0, WALLS[1]])
    distribute(count=6, width=OUTER_WALL[0])
    translate([-1, 0, 0])
    square([2, depth[1]]);
  }

  module short_wall_insets() {
    translate([WALLS[0], OUTER_WALL[1]])
    rotate([0, 0, 270])
    distribute(count=2, width=OUTER_WALL[1])
    translate([-1, 0, 0])
    square([2, depth[0]]);
  }

  long_wall_insets();

  translate([0, OUTER_WALL[1]])
  mirror([0, 1, 0])
  long_wall_insets();

  short_wall_insets();

  translate([OUTER_WALL[0], 0])
  mirror([1, 0, 0])
  short_wall_insets();
}

module attachment_points() {
  module long_wall_points() {
    EXTRA = 14;
    translate([-EXTRA, OUTER_WALL[1] - WALLS[1], -10])
    distribute(count=3, width=OUTER_WALL[0] + 2 * EXTRA)
    children();
  }

  module short_wall_points() {
    translate([WALLS[0], 0, -10])
    rotate([0, 0, 90])
    distribute(count=1, width=OUTER_WALL[1])
    children();
  }

  long_wall_points()
  children();

  short_wall_points()
  children();

  rotate([0, 0, 180])
  translate(-OUTER_WALL)
  union() {
    long_wall_points()
    children();

    short_wall_points()
    children();
  }
}

module case_wall() {
  difference() {
    rounded_panel(OUTER_WALL);

    translate((OUTER_WALL - INNER_WALL) / 2)
    rounded_panel(INNER_WALL);
  }
}
// file: util/distribute.scad
module distribute(count, width, debug=false) {
  GAP = width / (count + 1);

  if (debug) {
    #square([width, 1]);
  }

  for (i = [1:count]) {
    translate([GAP * i, 0])
    children();
  }
}
// file: util/panel.scad
module rounded_panel(size, r=3) {
  panel(size[0] - 2*r, size[1] - 2*r)
  translate([r, r])
  circle(r);
}

module panel(w, l) {
  hull() {
    for (x=[0, w]) {
      for (y=[0, l]) {
        translate([x, y])
        children();
      }
    }
  }
}
// main file
use <util/panel.scad>;
use <util/distribute.scad>;
use <case.scad>;
use <light_box.scad>;


$fa = 1;
$fs = 0.1;

OVERHANG = [2, 2];
OUTER_WALL = case_dimensions();
INNER_WALL = light_box_dimensions() - 2 * OVERHANG;

echo(OUTER_WALL);
cover();


module cover() {
  ring();

  attachment_points()
  hook();
}

module ring() {
  linear_extrude(2)
  difference() {
    rounded_panel(OUTER_WALL);

    translate((OUTER_WALL - INNER_WALL) / 2)
    rounded_panel(INNER_WALL);
  }
}

module hook() {
  translate([-5, -1, 0])
  union() {
    hull() {
      cube([10, 1, 10]);

      translate([0.5, -1, 9])
      cube([9, 1, 1]);
    }


    hull() {
      cube([10, 1, 1.5]);

      translate([0.5, 1.5, 0.5])
      cube([9, 0.5, 0.5]);
    }
  }
}
